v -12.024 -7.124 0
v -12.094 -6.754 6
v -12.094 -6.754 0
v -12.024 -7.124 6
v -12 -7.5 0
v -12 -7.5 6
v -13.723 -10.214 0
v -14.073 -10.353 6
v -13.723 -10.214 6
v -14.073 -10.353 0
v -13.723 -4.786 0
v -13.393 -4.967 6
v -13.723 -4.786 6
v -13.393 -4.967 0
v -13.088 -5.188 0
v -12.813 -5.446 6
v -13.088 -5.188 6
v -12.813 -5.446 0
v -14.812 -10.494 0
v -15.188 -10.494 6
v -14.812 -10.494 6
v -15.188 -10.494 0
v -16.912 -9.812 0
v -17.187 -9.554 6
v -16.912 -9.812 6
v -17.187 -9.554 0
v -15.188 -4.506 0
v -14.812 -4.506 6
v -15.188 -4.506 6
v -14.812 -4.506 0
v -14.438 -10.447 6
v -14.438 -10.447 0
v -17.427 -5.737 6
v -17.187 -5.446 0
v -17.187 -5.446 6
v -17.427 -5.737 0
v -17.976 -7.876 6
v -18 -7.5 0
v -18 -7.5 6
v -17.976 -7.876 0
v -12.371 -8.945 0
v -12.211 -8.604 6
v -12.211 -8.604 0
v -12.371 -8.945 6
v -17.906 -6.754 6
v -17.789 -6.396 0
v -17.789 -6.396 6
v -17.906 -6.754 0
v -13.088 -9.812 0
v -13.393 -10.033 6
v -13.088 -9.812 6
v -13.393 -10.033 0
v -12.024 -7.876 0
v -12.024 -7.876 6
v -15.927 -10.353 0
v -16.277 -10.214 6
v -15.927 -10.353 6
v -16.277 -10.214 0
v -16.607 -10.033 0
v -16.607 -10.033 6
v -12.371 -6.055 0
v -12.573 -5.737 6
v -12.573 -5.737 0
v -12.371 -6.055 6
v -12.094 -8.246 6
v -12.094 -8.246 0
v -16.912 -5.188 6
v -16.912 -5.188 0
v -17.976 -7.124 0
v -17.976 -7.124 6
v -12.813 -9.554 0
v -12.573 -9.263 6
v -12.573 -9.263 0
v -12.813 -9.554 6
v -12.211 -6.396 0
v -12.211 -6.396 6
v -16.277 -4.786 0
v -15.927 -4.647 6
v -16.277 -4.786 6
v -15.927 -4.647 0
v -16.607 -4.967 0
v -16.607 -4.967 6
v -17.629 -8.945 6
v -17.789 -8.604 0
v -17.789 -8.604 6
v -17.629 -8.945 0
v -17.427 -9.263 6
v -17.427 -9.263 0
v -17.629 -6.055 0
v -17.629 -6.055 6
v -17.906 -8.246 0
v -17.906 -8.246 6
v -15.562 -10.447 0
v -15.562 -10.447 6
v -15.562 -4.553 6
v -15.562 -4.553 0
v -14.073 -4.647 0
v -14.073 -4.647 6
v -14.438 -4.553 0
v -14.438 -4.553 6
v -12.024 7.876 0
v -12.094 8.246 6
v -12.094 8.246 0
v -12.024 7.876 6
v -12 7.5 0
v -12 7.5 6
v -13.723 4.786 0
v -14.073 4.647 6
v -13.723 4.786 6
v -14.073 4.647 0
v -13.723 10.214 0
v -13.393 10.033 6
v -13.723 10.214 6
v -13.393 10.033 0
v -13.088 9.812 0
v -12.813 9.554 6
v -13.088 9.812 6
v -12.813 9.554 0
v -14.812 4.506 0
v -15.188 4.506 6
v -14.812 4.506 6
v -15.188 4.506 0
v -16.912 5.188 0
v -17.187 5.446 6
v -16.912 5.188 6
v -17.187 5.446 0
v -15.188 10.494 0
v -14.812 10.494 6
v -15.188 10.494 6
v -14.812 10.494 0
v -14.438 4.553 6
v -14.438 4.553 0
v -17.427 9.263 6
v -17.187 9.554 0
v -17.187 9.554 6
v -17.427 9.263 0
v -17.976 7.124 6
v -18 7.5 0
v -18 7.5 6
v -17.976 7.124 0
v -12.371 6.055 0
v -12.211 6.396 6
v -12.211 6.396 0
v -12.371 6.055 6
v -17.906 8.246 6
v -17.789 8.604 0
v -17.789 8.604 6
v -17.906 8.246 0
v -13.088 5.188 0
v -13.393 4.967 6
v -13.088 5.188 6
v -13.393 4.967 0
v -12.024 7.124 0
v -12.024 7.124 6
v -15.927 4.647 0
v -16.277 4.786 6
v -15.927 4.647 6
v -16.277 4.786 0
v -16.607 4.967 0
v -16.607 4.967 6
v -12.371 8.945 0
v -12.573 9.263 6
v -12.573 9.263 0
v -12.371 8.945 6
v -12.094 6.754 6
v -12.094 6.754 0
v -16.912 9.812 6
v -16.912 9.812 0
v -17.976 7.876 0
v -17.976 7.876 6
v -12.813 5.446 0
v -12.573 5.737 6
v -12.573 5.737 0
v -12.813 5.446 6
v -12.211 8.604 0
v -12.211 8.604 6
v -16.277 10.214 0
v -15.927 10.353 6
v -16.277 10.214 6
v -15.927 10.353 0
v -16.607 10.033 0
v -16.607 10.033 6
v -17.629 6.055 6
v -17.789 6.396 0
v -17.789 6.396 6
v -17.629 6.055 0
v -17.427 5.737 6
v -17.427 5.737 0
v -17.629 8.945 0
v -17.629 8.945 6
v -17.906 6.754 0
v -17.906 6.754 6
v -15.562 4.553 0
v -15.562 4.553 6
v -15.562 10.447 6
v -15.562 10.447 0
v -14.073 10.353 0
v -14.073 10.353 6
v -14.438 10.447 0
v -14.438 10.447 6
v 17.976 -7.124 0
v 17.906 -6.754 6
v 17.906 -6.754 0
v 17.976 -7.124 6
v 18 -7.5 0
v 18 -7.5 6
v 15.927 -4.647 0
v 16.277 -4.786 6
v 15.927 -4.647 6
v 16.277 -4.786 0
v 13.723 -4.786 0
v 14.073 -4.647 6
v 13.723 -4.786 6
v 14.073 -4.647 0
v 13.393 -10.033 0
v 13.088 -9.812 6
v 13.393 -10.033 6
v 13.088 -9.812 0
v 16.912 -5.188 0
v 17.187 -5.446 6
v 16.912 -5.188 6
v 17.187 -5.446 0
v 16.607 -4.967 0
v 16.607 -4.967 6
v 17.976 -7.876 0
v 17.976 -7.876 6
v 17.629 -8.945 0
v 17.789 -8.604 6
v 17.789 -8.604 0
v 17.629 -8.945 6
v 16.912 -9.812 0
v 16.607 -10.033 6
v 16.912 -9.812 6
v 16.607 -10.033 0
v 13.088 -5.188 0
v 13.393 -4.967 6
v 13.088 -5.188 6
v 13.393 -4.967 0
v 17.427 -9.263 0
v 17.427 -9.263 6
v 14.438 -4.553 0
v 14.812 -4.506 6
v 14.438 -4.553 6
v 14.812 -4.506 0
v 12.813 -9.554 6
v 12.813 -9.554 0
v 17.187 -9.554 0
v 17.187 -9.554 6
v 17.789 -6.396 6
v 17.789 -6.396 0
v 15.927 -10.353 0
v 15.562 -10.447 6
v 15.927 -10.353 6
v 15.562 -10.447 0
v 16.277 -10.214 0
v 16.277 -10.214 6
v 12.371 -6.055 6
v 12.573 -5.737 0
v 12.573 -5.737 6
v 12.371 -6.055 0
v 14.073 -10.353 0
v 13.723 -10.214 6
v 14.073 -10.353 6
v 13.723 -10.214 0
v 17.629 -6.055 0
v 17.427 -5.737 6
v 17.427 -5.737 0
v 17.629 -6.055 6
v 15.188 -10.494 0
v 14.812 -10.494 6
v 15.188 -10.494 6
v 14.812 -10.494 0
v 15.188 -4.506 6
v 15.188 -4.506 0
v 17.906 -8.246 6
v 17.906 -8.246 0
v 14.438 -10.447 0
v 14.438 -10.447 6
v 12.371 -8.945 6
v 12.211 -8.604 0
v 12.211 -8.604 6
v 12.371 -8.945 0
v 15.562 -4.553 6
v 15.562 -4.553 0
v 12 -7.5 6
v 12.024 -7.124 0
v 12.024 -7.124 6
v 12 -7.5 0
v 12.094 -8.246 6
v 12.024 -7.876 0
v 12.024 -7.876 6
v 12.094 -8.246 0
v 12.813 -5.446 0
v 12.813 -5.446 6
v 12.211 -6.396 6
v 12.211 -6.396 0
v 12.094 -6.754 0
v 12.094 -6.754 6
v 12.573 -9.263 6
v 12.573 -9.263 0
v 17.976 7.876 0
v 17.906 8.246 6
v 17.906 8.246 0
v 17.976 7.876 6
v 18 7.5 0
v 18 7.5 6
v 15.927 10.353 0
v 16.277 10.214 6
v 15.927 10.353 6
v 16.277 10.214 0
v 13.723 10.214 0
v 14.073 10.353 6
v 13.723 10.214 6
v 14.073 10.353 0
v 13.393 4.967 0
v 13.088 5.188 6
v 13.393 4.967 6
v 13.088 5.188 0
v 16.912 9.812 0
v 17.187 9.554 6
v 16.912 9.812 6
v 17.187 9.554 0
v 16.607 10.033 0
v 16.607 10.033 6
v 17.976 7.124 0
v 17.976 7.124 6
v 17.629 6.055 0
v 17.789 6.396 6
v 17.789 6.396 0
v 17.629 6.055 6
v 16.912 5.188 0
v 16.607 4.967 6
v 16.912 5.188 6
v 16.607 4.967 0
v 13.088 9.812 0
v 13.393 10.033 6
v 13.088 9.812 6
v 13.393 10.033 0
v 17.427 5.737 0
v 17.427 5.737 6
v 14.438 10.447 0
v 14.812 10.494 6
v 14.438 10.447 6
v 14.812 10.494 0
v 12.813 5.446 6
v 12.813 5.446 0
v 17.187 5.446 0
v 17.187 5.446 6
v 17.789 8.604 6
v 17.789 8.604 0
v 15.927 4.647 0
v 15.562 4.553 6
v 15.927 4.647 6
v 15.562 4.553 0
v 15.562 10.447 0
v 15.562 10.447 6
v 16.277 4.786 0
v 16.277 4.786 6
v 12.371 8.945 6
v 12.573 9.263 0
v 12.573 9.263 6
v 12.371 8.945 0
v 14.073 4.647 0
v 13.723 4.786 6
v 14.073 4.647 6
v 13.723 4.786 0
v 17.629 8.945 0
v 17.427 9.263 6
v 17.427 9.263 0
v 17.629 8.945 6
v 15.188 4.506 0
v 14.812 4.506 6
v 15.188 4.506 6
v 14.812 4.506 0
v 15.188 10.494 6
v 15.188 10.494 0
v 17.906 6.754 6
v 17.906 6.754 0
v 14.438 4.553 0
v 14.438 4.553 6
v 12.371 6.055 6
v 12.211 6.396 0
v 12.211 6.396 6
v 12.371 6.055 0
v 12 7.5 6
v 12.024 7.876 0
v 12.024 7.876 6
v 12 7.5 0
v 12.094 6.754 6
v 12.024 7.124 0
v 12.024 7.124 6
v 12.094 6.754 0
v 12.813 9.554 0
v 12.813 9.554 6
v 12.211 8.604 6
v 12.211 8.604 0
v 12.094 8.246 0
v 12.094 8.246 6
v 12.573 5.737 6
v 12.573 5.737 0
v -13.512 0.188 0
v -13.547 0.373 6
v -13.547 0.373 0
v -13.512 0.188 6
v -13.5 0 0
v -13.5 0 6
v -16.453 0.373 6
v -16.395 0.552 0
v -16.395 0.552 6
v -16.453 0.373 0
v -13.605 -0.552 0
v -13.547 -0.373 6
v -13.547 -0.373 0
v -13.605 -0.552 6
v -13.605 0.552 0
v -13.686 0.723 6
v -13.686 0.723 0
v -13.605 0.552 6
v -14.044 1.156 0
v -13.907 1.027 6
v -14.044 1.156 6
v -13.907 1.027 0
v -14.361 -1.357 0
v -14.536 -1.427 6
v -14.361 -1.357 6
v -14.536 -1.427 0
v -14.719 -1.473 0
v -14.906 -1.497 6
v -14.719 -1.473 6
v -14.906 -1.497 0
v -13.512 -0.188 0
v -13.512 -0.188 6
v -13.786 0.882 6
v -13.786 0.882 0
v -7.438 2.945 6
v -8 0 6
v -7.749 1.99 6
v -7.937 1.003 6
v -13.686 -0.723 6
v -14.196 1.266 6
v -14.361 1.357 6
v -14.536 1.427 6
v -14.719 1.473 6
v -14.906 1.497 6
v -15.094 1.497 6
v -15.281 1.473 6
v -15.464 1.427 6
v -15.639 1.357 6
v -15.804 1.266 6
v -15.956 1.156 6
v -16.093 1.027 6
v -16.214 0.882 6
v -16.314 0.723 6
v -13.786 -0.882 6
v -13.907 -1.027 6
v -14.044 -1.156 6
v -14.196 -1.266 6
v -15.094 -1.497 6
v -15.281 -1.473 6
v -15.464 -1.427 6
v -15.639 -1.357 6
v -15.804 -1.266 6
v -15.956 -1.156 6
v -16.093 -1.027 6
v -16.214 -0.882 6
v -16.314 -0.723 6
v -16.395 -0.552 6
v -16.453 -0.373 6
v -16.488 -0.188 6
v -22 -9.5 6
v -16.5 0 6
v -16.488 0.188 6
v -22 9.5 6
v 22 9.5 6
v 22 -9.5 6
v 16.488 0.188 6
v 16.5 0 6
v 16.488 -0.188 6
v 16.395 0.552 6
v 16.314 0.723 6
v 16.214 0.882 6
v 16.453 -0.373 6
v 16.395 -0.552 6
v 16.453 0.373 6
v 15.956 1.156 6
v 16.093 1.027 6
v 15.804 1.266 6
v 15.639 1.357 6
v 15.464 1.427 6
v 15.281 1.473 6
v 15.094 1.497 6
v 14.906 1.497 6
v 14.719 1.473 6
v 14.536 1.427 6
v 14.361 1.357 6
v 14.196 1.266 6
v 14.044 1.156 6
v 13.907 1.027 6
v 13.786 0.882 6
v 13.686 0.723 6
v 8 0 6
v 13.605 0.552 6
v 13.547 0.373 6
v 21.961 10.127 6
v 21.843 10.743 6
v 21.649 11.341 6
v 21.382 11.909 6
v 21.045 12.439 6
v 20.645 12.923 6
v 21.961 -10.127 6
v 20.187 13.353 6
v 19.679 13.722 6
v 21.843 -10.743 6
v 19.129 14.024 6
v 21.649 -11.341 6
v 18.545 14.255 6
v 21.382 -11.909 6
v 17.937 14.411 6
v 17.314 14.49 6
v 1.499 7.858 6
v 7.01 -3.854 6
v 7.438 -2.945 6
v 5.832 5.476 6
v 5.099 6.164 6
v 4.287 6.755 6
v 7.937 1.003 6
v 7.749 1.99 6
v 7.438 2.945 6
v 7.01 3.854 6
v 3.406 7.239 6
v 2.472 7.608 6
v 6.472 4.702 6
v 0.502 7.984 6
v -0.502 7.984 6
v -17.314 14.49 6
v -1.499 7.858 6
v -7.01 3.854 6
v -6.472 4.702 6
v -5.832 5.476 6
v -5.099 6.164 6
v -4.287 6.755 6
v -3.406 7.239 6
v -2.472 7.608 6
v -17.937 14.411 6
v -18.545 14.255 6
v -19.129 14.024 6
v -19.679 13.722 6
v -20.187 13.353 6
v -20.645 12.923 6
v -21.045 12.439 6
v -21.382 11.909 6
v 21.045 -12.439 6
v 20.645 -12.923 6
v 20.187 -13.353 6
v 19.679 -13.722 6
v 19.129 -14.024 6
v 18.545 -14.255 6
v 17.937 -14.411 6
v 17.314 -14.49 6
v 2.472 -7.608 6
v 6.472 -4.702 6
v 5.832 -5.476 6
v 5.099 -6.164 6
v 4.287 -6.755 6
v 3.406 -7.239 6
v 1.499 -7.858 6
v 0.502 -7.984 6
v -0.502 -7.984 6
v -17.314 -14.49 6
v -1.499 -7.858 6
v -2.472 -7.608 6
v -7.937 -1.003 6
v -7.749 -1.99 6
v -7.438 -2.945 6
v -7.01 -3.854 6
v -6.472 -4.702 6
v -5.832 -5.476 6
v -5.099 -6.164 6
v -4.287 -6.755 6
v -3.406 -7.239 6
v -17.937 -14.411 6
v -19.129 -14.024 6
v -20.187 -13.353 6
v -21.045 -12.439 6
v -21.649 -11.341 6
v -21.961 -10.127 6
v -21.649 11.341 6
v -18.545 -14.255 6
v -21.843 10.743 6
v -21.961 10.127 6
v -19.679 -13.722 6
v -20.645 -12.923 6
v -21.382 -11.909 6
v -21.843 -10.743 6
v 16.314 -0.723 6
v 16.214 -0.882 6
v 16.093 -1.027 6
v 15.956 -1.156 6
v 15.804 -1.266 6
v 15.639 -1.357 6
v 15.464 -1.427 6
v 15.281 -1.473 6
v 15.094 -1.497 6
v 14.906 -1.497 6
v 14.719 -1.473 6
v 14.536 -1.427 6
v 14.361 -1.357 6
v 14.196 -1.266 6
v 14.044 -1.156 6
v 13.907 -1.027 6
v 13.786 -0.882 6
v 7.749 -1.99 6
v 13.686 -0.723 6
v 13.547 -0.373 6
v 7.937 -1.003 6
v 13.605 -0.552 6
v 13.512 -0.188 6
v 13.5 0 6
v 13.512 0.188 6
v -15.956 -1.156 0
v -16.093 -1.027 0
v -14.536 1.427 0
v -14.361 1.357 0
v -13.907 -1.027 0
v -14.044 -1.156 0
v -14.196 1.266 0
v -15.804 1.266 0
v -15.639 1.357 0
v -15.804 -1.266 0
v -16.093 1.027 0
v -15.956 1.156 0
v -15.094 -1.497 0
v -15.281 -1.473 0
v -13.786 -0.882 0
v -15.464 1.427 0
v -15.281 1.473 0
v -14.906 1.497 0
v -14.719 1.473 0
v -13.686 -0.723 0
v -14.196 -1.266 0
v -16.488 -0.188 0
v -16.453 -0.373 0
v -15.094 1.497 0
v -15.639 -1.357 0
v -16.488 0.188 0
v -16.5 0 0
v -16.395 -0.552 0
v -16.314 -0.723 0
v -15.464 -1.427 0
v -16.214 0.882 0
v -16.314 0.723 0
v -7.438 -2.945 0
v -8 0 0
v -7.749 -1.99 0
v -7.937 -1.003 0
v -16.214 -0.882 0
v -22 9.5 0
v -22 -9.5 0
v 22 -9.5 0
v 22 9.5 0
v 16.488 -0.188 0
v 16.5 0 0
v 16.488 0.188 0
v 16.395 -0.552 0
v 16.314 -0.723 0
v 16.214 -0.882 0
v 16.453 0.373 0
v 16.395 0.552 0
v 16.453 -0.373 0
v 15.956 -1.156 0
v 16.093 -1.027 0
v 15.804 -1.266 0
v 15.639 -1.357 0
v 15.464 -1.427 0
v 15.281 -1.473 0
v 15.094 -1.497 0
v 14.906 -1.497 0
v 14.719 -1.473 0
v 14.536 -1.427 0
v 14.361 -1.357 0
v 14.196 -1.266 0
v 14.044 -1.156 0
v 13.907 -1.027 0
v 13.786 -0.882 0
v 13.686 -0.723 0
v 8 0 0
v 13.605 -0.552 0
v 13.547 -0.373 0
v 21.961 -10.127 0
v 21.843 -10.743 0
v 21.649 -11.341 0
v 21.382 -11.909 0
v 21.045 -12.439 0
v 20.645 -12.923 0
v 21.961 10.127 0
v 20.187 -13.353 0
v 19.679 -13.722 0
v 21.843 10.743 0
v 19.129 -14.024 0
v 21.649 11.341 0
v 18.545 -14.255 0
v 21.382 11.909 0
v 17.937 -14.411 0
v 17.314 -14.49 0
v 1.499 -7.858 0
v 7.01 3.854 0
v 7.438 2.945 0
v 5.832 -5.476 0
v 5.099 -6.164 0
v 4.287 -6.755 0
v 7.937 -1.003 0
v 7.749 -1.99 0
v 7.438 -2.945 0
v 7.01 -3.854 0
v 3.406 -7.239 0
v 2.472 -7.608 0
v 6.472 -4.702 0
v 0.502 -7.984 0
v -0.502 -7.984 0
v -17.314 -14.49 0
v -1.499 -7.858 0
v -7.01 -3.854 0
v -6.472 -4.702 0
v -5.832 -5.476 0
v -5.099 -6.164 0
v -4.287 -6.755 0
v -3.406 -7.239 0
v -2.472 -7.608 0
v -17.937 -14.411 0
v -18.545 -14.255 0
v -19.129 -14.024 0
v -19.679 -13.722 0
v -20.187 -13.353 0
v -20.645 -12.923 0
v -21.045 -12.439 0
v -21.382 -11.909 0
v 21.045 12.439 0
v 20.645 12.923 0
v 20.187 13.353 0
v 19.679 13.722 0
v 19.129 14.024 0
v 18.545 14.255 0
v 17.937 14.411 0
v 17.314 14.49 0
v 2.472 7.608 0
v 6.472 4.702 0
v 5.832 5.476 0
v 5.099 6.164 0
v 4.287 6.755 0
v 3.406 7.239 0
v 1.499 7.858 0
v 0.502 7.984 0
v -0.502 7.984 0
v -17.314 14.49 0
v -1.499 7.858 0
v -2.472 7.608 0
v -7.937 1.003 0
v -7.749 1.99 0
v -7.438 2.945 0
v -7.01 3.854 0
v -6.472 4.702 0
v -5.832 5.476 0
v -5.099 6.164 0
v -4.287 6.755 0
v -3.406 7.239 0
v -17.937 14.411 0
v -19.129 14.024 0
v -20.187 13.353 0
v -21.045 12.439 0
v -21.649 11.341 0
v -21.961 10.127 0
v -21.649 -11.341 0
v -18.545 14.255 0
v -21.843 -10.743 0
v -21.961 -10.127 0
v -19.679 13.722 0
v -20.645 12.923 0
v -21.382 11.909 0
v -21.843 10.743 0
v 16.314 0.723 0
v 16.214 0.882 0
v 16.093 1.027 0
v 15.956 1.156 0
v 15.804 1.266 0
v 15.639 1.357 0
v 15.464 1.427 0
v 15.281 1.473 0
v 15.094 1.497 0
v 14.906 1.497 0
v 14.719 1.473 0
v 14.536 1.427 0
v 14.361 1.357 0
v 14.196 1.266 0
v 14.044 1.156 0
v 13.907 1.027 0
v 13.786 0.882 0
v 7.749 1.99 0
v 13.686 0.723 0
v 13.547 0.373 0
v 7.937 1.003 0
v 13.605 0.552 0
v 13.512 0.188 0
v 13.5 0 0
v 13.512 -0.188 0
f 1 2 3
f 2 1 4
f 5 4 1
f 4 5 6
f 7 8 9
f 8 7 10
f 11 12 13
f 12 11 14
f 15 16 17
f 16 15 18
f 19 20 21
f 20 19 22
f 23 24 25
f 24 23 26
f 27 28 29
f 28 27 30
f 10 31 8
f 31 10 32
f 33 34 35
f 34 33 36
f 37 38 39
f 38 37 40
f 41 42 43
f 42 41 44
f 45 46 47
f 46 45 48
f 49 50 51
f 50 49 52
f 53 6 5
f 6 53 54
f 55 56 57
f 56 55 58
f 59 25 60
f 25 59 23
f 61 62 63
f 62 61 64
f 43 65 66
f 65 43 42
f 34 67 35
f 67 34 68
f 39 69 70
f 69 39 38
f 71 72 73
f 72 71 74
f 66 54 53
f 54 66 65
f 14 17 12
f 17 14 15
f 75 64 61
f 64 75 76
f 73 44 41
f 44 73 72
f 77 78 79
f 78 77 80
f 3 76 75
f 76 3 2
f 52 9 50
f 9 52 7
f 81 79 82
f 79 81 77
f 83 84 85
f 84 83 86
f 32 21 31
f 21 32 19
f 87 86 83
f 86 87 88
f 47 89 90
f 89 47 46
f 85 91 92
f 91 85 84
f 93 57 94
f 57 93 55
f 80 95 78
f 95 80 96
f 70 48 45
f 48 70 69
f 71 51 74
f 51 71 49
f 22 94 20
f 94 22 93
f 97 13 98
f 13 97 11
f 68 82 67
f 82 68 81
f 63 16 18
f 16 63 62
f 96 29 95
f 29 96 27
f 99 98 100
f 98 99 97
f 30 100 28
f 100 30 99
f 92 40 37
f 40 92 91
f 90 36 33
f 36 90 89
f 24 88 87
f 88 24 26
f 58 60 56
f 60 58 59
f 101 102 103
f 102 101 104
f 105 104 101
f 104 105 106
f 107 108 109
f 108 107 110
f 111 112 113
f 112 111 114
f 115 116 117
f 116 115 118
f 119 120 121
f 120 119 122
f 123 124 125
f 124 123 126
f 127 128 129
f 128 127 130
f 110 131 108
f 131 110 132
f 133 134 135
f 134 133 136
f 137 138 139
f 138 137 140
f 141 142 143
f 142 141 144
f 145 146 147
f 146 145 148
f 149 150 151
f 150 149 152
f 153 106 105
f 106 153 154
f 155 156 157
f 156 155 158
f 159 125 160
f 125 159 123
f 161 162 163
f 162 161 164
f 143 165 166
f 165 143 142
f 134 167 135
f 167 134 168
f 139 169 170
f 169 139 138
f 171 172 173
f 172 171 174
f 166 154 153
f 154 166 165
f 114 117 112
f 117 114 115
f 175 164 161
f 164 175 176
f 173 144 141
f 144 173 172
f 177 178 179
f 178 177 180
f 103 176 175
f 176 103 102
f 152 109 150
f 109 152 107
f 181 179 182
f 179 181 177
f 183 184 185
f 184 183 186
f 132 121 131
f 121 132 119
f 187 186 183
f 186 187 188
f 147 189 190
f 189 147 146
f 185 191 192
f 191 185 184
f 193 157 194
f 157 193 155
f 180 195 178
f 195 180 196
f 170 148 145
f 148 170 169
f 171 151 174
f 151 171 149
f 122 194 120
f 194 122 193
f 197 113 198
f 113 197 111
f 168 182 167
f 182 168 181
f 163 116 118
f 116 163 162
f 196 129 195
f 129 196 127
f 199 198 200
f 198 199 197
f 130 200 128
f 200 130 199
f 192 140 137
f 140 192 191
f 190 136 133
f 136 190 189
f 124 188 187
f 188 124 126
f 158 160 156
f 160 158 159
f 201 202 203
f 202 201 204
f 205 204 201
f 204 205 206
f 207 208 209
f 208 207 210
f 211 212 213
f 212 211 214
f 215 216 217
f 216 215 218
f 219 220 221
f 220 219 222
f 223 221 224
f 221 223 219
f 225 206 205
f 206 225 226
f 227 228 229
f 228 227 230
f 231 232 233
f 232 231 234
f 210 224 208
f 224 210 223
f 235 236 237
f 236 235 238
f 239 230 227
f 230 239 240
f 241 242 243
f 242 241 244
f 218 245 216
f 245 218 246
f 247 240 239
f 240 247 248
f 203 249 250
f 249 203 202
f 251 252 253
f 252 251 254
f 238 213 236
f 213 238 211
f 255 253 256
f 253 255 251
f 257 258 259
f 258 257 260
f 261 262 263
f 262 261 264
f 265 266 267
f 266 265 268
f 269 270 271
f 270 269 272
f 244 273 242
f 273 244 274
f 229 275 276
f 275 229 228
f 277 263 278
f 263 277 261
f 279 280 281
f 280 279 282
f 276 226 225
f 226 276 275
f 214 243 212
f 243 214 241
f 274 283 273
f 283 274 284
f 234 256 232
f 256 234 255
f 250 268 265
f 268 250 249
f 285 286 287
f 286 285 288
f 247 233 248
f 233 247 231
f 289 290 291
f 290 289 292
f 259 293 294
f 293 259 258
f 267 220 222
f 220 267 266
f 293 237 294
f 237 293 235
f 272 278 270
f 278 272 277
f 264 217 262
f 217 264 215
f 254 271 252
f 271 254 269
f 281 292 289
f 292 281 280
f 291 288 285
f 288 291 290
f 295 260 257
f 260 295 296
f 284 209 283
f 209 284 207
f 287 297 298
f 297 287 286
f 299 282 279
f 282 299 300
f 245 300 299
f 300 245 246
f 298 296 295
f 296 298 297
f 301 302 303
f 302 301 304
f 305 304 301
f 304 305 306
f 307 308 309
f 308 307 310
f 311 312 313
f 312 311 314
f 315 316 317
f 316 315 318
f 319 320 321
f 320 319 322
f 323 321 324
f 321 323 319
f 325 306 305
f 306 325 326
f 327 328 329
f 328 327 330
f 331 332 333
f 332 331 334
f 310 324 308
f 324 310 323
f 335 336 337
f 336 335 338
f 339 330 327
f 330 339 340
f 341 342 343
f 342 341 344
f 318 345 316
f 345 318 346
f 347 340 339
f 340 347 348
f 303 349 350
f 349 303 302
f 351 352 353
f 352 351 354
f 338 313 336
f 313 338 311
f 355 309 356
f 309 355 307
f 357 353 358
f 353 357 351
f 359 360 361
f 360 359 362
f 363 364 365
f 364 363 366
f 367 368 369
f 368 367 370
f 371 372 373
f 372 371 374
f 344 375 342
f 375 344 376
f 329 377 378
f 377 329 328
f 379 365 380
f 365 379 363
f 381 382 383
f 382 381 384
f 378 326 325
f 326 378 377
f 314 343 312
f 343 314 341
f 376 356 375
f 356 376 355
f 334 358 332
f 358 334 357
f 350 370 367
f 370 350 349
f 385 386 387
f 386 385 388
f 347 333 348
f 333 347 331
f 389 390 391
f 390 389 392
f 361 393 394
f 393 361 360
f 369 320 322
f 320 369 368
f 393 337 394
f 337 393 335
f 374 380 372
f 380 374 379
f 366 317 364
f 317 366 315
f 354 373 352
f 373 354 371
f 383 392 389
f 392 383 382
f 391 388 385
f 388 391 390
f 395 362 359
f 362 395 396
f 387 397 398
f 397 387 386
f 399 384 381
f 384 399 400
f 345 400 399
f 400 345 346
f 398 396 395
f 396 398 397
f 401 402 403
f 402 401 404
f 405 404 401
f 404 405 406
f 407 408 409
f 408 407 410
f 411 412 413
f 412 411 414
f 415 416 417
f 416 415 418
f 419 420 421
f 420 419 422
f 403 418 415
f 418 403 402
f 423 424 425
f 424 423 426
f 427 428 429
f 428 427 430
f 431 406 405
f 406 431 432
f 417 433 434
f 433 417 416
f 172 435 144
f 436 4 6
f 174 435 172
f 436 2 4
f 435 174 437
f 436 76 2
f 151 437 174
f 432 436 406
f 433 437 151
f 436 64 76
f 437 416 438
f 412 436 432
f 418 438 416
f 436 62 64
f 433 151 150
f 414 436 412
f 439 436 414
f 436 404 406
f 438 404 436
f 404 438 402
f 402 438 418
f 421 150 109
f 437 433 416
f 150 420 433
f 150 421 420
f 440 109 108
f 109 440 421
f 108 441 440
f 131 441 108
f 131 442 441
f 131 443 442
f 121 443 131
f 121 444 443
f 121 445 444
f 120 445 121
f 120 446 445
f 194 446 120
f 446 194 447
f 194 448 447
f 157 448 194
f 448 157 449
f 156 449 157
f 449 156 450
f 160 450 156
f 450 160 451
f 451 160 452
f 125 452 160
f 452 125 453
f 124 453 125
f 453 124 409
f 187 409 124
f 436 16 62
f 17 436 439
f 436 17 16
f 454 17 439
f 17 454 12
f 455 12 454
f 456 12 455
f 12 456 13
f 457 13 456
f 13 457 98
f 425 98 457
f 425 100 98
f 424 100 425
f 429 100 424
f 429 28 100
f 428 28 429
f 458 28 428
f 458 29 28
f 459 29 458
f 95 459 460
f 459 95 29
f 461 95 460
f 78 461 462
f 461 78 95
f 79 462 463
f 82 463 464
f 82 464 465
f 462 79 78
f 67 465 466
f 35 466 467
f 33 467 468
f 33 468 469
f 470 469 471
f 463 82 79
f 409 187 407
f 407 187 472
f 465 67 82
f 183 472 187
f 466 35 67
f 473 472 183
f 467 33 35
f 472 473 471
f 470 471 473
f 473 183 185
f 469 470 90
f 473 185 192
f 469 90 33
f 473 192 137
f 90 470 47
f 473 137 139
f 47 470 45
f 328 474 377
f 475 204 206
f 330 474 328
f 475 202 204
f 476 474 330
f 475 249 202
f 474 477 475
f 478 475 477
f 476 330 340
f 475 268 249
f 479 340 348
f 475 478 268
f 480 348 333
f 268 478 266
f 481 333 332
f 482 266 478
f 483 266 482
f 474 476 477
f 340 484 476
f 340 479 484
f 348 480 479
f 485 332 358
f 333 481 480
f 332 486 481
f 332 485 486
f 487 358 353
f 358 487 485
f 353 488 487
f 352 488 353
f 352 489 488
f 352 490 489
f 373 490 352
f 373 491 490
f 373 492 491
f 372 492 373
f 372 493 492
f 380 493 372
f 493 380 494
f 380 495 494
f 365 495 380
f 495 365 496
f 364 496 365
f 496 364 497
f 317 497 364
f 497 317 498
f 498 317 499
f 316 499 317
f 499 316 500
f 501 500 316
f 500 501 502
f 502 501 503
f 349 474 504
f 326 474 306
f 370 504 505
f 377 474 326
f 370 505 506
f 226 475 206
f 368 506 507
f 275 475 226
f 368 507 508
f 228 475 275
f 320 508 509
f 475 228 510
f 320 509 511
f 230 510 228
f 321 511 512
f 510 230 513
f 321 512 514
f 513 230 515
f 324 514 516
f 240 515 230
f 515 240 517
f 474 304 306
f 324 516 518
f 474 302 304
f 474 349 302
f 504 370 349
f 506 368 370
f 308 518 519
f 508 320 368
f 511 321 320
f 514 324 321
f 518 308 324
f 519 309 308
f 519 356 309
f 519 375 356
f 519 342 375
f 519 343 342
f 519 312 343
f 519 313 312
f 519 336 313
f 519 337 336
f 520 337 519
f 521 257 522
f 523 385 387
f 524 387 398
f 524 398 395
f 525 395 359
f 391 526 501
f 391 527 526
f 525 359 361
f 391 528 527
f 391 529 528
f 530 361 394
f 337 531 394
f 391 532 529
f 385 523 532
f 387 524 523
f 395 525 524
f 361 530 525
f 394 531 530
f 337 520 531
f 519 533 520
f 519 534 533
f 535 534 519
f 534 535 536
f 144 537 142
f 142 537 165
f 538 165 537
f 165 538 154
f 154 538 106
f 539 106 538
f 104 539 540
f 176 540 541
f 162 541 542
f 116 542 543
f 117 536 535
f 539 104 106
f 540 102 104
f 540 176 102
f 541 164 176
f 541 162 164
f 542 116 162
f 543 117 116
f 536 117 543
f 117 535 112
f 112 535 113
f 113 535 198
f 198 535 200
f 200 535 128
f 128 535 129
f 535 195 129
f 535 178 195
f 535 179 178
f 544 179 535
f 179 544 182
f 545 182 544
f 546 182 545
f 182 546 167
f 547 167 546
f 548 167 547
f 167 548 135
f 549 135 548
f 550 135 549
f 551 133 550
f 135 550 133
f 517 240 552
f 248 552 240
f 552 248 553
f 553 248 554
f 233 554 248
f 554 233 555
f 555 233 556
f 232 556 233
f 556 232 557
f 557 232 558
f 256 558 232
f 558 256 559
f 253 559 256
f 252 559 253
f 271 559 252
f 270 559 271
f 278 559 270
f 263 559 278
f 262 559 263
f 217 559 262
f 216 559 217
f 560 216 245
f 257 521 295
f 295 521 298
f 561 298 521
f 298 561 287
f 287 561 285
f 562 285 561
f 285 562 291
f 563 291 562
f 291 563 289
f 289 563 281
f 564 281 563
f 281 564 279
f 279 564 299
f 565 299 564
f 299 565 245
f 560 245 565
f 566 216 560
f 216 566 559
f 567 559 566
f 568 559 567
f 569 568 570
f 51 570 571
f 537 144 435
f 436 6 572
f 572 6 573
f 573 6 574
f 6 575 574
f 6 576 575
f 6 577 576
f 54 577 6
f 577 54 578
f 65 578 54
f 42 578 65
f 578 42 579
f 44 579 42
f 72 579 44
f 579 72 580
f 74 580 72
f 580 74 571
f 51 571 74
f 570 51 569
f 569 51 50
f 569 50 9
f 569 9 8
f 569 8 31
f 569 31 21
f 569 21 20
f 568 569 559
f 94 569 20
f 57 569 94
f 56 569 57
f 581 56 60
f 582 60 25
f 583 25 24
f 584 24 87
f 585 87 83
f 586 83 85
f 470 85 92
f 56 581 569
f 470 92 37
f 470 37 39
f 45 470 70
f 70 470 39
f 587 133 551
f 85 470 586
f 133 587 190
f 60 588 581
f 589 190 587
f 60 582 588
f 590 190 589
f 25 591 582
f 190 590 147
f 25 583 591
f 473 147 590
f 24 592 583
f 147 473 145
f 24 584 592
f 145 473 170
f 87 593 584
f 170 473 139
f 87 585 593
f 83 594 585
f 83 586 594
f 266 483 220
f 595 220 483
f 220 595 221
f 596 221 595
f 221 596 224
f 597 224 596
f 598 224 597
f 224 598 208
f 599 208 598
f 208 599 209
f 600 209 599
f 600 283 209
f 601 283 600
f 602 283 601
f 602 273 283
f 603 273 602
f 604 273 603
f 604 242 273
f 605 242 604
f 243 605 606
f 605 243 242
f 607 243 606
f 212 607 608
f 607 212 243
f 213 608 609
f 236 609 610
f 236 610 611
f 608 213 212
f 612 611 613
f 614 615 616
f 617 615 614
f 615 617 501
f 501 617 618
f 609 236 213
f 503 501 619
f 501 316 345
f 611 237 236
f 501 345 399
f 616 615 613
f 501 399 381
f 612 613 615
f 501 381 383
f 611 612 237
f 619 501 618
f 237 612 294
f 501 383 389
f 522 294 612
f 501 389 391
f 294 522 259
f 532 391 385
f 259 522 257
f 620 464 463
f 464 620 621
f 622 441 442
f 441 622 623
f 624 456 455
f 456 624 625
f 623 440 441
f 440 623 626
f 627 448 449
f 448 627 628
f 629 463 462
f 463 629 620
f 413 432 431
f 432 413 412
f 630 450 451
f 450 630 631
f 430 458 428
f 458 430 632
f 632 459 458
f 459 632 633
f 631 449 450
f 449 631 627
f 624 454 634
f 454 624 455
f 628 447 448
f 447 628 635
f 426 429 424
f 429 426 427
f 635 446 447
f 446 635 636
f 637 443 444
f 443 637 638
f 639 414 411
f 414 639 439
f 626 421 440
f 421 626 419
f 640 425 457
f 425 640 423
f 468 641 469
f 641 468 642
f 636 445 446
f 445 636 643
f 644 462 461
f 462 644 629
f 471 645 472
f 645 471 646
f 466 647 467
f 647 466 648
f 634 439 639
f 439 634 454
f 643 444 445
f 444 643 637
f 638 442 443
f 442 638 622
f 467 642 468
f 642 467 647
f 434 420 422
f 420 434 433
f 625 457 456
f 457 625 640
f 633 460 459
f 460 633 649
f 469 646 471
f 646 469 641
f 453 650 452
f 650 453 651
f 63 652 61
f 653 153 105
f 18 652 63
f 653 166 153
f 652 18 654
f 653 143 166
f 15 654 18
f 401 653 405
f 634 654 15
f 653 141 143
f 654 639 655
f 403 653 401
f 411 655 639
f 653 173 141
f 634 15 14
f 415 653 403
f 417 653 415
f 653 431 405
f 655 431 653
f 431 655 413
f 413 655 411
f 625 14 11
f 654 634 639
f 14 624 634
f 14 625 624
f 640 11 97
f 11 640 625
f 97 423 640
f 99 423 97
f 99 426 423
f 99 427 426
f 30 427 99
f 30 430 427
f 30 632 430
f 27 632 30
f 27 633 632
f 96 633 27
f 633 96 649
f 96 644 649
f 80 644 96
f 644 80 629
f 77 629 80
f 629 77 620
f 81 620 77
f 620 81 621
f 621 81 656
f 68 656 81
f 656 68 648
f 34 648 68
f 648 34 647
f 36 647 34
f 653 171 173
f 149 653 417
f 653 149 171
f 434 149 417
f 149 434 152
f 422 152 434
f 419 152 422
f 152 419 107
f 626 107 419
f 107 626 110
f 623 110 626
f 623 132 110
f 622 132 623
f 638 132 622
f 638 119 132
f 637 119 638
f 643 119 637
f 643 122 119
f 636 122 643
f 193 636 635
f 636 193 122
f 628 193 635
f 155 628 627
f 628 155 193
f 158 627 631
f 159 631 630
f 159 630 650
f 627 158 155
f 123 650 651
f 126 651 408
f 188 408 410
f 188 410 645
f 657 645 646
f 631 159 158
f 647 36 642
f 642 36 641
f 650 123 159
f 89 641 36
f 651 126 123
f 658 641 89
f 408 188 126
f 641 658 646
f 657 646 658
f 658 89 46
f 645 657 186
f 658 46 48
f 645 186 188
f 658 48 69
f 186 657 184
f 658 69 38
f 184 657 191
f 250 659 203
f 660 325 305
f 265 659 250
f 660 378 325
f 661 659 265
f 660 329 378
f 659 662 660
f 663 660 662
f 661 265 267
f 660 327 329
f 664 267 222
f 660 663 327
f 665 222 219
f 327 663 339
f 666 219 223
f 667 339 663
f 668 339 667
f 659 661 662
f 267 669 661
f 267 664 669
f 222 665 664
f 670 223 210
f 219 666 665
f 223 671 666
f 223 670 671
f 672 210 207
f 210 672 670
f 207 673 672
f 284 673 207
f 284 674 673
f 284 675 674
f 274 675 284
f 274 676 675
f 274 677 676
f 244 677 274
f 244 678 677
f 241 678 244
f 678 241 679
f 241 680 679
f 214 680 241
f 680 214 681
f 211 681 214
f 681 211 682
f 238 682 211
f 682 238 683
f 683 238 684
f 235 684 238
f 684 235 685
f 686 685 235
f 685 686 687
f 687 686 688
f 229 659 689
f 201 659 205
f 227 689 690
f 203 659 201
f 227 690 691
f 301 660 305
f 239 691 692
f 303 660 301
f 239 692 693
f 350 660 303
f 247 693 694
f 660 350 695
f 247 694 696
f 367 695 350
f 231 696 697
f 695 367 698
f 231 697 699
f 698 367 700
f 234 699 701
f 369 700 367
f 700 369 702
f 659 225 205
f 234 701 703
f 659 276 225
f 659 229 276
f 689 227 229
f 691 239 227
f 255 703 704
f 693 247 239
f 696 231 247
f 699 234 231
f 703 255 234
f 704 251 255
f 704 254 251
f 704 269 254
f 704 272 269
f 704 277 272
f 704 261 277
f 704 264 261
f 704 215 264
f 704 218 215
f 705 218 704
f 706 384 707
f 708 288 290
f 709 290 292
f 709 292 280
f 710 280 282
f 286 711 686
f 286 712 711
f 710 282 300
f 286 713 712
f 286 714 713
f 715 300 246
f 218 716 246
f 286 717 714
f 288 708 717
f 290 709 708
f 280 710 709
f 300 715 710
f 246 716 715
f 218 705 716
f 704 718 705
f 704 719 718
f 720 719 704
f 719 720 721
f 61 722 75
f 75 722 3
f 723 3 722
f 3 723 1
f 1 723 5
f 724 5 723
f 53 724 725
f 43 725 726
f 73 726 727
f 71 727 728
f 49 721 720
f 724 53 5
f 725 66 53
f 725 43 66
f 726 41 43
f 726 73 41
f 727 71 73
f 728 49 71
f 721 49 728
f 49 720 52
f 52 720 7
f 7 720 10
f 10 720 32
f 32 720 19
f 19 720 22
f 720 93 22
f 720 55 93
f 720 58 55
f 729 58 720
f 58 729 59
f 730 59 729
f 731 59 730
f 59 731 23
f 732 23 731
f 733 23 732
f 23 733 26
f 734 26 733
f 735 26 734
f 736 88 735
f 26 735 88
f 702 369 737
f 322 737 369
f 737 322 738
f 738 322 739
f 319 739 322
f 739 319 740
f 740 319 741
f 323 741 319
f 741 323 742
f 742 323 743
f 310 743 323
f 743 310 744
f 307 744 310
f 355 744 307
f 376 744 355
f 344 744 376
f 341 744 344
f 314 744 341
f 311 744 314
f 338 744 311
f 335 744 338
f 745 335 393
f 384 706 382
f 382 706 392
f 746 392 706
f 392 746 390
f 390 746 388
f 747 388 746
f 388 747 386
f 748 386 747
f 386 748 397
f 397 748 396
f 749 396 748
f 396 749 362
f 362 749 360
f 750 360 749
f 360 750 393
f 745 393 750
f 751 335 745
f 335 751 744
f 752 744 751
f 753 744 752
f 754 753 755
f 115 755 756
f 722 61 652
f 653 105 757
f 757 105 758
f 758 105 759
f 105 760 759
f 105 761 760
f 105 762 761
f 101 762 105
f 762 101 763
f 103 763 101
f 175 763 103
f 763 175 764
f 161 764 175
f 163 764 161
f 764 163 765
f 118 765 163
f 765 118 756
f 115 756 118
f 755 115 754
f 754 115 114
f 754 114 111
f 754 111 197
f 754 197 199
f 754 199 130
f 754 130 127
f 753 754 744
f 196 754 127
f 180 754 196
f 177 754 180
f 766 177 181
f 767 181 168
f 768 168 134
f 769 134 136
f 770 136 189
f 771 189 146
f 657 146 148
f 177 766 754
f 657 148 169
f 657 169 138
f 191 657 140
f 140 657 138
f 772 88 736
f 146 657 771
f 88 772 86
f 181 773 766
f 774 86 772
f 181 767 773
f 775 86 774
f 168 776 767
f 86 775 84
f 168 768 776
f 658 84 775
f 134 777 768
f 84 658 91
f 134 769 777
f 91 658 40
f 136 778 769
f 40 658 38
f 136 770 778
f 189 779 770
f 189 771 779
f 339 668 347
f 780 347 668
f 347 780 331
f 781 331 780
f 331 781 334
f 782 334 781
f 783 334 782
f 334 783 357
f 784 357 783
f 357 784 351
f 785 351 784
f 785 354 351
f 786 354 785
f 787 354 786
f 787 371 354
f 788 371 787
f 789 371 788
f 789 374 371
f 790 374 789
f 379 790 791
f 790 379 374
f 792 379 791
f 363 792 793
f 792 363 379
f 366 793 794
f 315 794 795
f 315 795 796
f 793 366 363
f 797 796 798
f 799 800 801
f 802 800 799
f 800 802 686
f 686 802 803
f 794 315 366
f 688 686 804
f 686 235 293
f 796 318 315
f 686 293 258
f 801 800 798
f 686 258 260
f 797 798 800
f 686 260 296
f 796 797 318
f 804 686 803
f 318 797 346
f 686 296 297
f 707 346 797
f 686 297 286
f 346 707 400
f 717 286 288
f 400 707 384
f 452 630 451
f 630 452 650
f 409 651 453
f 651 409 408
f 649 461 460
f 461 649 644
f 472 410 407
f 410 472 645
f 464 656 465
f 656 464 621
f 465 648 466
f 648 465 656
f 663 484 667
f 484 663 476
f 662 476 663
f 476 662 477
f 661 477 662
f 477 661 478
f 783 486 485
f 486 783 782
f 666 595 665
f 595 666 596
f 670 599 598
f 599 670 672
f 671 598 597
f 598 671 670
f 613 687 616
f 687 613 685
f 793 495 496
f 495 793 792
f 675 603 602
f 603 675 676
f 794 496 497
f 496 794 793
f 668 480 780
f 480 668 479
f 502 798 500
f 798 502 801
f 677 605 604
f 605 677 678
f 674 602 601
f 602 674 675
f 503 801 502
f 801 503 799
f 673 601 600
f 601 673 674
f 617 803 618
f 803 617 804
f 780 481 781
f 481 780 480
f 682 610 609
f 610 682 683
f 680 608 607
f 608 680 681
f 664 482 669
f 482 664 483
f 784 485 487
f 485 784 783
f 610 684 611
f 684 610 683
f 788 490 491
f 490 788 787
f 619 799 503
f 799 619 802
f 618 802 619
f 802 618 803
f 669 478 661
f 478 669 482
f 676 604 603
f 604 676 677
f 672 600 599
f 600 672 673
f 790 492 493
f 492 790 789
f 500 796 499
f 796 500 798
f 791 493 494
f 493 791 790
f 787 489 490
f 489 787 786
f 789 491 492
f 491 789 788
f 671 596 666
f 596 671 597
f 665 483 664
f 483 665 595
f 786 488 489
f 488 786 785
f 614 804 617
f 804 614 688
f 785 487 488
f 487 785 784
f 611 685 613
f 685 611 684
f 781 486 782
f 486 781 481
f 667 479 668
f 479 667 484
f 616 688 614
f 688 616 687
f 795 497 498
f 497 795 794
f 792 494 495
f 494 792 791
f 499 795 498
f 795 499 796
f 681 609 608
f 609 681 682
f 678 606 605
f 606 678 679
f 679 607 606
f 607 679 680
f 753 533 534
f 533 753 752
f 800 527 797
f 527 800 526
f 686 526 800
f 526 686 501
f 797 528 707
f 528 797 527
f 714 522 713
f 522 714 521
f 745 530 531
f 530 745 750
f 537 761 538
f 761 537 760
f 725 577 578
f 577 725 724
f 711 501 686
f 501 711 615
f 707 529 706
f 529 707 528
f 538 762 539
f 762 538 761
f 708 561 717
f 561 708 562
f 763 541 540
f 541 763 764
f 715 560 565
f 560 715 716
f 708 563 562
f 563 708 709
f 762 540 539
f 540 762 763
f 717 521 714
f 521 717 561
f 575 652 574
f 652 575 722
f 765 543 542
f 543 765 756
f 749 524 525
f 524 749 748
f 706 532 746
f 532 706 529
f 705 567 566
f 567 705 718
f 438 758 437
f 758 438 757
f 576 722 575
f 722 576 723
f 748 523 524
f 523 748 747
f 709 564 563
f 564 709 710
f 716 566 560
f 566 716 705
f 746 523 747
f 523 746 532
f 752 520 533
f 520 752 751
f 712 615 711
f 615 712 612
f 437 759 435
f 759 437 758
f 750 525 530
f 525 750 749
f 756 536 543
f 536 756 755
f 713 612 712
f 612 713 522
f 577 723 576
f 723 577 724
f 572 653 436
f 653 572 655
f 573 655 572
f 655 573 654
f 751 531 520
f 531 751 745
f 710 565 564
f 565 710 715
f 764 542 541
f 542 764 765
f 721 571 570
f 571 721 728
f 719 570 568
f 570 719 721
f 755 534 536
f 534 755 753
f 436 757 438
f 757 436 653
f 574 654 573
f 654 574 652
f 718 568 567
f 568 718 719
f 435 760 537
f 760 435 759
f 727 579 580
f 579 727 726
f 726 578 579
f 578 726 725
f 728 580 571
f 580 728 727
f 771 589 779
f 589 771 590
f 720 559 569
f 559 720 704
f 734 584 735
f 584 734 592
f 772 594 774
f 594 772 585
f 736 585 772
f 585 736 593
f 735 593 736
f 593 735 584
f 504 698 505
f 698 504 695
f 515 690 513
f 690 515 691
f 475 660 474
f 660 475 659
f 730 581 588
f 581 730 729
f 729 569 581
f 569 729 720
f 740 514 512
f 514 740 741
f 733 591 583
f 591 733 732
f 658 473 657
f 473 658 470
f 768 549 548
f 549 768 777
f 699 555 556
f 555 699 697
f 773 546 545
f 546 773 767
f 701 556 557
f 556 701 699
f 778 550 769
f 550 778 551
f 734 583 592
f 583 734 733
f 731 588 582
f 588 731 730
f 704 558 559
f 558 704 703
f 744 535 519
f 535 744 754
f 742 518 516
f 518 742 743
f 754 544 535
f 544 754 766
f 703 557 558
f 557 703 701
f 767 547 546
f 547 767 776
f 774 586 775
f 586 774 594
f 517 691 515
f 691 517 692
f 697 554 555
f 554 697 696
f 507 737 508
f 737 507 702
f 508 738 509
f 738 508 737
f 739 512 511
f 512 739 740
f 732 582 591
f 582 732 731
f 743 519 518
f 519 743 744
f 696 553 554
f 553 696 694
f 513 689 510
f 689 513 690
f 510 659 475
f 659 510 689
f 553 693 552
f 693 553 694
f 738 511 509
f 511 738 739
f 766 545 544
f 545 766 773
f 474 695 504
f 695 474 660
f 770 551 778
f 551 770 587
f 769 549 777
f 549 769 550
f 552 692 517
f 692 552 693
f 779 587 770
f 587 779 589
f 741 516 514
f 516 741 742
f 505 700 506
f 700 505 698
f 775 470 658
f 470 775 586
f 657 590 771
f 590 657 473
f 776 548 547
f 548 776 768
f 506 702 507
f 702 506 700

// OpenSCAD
$fn = 50;


difference() {
	union() {
		hull() {
			translate(v = [-17.0000000000, 9.5000000000, 0]) {
				cylinder(h = 6, r = 5);
			}
			translate(v = [17.0000000000, 9.5000000000, 0]) {
				cylinder(h = 6, r = 5);
			}
			translate(v = [-17.0000000000, -9.5000000000, 0]) {
				cylinder(h = 6, r = 5);
			}
			translate(v = [17.0000000000, -9.5000000000, 0]) {
				cylinder(h = 6, r = 5);
			}
		}
	}
	union() {
		#translate(v = [-15.0000000000, -7.5000000000, 0]) {
			cylinder(h = 6, r = 3.0000000000);
		}
		#translate(v = [-15.0000000000, 7.5000000000, 0]) {
			cylinder(h = 6, r = 3.0000000000);
		}
		#translate(v = [15.0000000000, -7.5000000000, 0]) {
			cylinder(h = 6, r = 3.0000000000);
		}
		#translate(v = [15.0000000000, 7.5000000000, 0]) {
			cylinder(h = 6, r = 3.0000000000);
		}
		#translate(v = [-15.0000000000, -7.5000000000, -100.0000000000]) {
			cylinder(h = 200, r = 3.0000000000);
		}
		#translate(v = [-15.0000000000, 7.5000000000, -100.0000000000]) {
			cylinder(h = 200, r = 3.0000000000);
		}
		#translate(v = [15.0000000000, -7.5000000000, -100.0000000000]) {
			cylinder(h = 200, r = 3.0000000000);
		}
		#translate(v = [15.0000000000, 7.5000000000, -100.0000000000]) {
			cylinder(h = 200, r = 3.0000000000);
		}
		#translate(v = [-15.0000000000, -7.5000000000, 0]) {
			cylinder(h = 6, r = 1.5000000000);
		}
		#translate(v = [-15.0000000000, 0.0000000000, 0]) {
			cylinder(h = 6, r = 1.5000000000);
		}
		#translate(v = [-15.0000000000, 7.5000000000, 0]) {
			cylinder(h = 6, r = 1.5000000000);
		}
		#translate(v = [15.0000000000, -7.5000000000, 0]) {
			cylinder(h = 6, r = 1.5000000000);
		}
		#translate(v = [15.0000000000, 0.0000000000, 0]) {
			cylinder(h = 6, r = 1.5000000000);
		}
		#translate(v = [15.0000000000, 7.5000000000, 0]) {
			cylinder(h = 6, r = 1.5000000000);
		}
		#translate(v = [-15.0000000000, -7.5000000000, 0]) {
			cylinder(h = 6, r = 1.5000000000);
		}
		#translate(v = [-15.0000000000, 0.0000000000, 0]) {
			cylinder(h = 6, r = 1.5000000000);
		}
		#translate(v = [-15.0000000000, 7.5000000000, 0]) {
			cylinder(h = 6, r = 1.5000000000);
		}
		#translate(v = [15.0000000000, -7.5000000000, 0]) {
			cylinder(h = 6, r = 1.5000000000);
		}
		#translate(v = [15.0000000000, 0.0000000000, 0]) {
			cylinder(h = 6, r = 1.5000000000);
		}
		#translate(v = [15.0000000000, 7.5000000000, 0]) {
			cylinder(h = 6, r = 1.5000000000);
		}
		#translate(v = [-15.0000000000, -7.5000000000, 0]) {
			cylinder(h = 6, r = 1.5000000000);
		}
		#translate(v = [-15.0000000000, 0.0000000000, 0]) {
			cylinder(h = 6, r = 1.5000000000);
		}
		#translate(v = [-15.0000000000, 7.5000000000, 0]) {
			cylinder(h = 6, r = 1.5000000000);
		}
		#translate(v = [15.0000000000, -7.5000000000, 0]) {
			cylinder(h = 6, r = 1.5000000000);
		}
		#translate(v = [15.0000000000, 0.0000000000, 0]) {
			cylinder(h = 6, r = 1.5000000000);
		}
		#translate(v = [15.0000000000, 7.5000000000, 0]) {
			cylinder(h = 6, r = 1.5000000000);
		}
		#cylinder(h = 6, r = 8.0000000000);
	}
}
